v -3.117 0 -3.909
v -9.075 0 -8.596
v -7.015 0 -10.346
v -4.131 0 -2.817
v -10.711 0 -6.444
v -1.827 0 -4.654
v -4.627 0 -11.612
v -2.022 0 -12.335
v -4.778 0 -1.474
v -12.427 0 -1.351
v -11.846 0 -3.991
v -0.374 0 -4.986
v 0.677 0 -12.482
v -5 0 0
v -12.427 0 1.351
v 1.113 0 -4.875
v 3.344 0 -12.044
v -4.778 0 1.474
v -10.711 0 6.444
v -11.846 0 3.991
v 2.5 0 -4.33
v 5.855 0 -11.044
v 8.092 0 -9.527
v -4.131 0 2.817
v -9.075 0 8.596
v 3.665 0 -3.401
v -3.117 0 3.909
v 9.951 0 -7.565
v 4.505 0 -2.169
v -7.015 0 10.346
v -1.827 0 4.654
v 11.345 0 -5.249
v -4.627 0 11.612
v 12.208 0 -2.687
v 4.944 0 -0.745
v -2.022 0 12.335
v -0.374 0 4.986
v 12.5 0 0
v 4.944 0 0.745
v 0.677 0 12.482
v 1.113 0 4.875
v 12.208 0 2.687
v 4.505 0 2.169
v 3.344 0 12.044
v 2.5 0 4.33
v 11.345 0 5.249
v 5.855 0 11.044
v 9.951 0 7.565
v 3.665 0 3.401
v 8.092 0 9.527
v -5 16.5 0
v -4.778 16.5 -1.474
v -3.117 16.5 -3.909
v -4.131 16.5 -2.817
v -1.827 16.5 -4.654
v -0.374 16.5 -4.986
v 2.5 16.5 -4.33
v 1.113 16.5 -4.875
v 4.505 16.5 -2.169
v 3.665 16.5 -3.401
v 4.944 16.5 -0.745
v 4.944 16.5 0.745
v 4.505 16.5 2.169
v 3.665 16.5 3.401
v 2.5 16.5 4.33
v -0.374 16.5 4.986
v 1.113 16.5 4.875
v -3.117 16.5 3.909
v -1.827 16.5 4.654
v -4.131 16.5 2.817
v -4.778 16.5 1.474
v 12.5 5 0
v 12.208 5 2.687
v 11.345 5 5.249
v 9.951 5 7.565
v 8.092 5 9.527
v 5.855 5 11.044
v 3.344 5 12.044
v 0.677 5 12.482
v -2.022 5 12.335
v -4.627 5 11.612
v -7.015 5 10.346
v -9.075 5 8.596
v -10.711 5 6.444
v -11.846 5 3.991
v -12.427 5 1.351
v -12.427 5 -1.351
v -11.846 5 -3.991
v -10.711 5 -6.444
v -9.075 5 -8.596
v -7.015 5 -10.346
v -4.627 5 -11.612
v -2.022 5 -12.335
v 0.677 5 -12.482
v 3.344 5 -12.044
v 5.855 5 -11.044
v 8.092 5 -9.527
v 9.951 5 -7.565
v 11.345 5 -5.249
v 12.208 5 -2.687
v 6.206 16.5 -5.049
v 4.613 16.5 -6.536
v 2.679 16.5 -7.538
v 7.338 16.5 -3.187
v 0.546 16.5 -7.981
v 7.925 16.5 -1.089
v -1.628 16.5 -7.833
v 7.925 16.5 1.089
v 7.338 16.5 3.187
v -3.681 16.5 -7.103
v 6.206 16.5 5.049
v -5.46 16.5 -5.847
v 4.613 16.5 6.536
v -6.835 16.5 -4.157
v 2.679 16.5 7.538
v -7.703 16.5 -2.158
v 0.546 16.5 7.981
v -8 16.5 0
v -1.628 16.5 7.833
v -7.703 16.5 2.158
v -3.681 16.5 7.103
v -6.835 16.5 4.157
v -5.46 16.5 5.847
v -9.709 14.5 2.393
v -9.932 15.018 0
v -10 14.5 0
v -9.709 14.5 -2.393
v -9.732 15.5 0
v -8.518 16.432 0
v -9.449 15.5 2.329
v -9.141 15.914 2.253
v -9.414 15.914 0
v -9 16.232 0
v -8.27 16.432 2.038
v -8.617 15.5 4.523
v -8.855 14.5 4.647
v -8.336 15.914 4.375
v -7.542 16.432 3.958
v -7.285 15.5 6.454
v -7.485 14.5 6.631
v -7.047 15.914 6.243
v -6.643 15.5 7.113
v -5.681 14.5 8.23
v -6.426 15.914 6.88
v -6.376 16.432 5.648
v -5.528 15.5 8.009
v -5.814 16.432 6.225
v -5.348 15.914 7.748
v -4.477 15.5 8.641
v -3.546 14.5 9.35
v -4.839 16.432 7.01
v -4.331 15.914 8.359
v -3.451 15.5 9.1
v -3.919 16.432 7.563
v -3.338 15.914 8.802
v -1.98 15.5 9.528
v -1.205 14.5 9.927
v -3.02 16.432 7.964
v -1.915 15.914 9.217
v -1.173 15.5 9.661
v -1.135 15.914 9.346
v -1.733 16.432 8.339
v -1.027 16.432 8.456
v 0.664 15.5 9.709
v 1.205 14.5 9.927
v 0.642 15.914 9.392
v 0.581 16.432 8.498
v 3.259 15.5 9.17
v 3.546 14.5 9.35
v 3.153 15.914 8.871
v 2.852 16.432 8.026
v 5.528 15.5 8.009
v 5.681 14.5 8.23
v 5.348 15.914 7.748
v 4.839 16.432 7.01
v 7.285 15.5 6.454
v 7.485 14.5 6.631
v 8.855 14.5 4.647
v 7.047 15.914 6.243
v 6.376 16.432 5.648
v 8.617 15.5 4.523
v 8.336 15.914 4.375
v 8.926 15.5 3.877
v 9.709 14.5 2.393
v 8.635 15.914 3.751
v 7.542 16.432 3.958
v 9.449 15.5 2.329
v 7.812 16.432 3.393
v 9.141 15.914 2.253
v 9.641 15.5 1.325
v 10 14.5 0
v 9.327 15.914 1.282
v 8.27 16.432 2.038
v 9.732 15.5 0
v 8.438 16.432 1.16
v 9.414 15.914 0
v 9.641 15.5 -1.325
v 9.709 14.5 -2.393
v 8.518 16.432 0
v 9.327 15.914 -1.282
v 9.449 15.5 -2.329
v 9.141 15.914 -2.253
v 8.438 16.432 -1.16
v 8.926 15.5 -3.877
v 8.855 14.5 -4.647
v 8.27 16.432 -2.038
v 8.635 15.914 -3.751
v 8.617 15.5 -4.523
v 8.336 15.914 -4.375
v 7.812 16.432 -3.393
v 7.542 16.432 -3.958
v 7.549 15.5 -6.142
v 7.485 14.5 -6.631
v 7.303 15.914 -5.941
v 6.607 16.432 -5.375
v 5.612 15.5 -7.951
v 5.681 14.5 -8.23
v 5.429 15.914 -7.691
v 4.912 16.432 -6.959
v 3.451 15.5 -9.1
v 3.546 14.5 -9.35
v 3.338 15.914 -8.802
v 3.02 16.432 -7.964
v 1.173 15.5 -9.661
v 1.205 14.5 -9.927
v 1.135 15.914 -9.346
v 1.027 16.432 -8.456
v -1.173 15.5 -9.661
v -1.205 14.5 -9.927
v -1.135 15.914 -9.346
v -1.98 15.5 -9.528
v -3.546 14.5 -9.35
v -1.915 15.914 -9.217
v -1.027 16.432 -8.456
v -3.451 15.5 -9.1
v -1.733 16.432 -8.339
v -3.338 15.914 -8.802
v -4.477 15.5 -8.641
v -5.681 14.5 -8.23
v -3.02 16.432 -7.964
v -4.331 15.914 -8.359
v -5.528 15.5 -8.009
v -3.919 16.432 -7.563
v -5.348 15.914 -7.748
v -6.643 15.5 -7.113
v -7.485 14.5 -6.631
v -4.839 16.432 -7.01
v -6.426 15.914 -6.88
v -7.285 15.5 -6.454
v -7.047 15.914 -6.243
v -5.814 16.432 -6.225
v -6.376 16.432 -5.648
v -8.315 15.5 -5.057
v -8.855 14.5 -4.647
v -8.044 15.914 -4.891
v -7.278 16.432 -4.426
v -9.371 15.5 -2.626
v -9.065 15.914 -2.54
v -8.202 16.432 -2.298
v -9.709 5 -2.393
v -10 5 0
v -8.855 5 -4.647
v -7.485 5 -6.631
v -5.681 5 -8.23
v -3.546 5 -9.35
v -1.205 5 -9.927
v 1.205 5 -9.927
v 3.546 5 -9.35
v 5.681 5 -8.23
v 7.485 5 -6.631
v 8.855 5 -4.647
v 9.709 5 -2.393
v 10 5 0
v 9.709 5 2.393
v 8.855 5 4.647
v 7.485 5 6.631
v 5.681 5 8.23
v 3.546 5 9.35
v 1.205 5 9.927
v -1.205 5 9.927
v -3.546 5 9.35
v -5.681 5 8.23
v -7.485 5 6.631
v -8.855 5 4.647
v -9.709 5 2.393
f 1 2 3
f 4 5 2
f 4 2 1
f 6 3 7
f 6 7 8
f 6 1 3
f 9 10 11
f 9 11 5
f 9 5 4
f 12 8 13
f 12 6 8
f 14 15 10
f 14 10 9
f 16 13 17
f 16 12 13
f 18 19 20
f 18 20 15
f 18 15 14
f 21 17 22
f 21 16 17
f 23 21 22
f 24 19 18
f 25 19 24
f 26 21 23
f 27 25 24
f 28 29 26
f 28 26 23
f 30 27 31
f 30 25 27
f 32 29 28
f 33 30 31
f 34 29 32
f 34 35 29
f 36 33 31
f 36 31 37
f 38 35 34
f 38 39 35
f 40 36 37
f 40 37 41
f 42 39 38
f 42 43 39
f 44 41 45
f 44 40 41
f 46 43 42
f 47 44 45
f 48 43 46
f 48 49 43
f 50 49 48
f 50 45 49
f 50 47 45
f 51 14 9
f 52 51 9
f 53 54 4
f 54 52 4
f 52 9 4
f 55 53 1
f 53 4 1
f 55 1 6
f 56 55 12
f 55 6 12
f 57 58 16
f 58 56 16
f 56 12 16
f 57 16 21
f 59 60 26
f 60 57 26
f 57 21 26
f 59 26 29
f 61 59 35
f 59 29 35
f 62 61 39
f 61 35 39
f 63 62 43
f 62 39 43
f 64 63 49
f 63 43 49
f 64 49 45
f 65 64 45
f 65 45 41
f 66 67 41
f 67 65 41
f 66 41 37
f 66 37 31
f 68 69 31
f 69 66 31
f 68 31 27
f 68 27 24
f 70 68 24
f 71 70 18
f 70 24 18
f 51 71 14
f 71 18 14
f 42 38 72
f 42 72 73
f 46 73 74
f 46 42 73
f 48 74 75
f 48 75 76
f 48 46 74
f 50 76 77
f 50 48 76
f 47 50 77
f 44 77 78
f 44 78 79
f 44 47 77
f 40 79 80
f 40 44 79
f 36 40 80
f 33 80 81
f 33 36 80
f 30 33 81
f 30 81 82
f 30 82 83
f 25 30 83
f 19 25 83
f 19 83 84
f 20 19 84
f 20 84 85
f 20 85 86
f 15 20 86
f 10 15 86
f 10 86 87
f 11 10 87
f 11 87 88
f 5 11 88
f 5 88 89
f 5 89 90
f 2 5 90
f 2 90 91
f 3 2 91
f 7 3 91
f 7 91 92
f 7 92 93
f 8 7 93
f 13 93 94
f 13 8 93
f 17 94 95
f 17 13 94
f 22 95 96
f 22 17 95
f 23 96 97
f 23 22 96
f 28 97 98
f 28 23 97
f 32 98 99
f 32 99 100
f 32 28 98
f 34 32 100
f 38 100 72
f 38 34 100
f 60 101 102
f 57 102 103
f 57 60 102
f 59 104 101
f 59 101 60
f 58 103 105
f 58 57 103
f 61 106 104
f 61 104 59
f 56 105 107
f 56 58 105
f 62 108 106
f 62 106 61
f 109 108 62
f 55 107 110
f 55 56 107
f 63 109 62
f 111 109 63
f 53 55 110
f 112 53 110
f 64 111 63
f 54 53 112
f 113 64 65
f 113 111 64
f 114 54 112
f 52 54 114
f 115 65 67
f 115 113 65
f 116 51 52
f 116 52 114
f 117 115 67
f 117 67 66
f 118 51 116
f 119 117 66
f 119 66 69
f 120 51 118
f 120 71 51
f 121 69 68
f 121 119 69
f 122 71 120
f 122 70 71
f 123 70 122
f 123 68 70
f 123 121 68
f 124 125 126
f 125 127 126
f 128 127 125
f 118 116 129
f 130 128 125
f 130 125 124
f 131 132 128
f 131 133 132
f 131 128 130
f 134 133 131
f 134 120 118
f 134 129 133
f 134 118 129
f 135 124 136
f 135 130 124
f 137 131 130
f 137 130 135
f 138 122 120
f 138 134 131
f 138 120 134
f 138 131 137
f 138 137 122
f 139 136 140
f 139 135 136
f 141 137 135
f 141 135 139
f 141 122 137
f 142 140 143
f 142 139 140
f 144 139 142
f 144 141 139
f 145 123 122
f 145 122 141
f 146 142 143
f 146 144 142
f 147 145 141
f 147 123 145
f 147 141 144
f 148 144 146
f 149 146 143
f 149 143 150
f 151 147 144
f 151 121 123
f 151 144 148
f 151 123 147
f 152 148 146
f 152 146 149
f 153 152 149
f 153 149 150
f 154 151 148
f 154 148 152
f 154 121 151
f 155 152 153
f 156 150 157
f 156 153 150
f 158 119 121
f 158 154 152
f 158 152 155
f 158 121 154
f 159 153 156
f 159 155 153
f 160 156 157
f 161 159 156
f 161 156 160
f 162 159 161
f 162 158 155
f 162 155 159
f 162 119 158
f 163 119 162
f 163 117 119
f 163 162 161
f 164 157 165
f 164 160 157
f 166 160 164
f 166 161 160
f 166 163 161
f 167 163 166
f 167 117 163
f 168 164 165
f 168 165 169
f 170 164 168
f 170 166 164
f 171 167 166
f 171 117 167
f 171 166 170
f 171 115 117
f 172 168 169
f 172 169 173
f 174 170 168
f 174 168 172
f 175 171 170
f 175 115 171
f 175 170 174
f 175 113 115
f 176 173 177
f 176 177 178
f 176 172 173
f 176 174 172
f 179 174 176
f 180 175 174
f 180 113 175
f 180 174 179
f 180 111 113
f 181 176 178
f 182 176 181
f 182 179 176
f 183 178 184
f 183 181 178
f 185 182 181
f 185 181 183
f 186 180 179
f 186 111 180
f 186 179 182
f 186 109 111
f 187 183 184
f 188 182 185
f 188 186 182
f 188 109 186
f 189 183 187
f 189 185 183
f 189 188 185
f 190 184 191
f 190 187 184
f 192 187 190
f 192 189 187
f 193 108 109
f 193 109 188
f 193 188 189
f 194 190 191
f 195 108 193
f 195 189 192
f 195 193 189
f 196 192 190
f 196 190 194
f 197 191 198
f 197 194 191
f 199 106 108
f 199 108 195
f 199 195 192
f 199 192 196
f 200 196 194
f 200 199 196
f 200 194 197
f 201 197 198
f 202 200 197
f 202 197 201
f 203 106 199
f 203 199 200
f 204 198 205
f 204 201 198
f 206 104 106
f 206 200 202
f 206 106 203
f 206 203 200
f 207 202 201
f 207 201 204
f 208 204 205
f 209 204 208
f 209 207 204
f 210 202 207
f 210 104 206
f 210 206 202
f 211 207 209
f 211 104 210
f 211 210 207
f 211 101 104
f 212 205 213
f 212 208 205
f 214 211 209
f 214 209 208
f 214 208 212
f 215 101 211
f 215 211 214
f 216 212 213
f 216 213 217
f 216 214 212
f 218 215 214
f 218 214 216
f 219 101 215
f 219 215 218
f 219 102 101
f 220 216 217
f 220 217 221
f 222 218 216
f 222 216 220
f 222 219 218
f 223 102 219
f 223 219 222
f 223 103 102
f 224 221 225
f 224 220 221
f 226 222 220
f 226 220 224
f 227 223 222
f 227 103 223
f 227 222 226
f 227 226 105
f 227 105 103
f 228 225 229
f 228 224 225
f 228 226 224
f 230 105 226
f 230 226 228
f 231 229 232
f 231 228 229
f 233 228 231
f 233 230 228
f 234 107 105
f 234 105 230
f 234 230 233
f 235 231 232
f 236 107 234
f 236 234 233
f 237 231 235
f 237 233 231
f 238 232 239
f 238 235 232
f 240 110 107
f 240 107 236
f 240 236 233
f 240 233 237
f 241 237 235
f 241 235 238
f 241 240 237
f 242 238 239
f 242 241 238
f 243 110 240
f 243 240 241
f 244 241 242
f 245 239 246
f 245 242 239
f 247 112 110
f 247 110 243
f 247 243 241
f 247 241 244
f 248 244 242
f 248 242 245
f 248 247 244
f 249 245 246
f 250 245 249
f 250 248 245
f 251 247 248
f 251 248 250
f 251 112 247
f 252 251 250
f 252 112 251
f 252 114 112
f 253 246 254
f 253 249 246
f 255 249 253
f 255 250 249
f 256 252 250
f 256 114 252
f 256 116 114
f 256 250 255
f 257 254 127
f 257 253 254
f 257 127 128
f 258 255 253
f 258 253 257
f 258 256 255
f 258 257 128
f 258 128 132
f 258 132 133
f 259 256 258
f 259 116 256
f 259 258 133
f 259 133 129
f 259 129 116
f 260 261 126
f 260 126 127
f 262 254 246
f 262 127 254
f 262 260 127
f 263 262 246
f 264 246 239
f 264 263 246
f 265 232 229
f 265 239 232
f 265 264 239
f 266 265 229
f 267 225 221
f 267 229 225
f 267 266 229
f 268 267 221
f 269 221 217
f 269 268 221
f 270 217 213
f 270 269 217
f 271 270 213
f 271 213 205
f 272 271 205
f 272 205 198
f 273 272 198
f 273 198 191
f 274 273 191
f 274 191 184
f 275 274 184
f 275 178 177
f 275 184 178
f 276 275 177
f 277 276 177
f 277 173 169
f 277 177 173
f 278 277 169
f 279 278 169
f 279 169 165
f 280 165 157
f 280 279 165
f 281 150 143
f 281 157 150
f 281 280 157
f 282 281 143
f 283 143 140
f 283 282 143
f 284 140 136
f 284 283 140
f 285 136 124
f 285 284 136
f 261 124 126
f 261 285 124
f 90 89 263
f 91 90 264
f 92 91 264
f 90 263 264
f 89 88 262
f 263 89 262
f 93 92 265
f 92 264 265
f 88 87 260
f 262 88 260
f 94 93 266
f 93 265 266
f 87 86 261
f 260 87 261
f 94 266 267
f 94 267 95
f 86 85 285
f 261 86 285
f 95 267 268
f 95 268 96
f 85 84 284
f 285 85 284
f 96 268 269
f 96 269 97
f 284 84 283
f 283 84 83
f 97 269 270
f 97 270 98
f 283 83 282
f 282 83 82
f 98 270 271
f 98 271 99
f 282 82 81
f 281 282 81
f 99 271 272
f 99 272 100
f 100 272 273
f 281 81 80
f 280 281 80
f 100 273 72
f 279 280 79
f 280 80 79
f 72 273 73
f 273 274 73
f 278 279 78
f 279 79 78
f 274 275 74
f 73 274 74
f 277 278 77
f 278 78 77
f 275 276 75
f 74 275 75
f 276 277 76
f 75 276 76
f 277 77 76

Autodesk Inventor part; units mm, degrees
ref_plane "YZ Plane" through (0, 0, 0) normal (1, 0, 0) x (0, 1, 0)
ref_plane "XZ Plane" through (0, 0, 0) normal (0, 1, 0) x (-1, 0, 0)
ref_plane "XY Plane" through (0, 0, 0) normal (0, 0, 1) x (1, 0, 0)
sketch "Sketch1" plane through (0, 0, 0) normal (0, 1, 0) x (-1, 0, 0)
  circle A0 centre (0, 0) radius 5
  circle A1 centre (0, 0) radius 10
  dimension "d0" = 10
  dimension "d1" = 20
extrude "Extrusion1" add sketch "Sketch1" along normal blind 16.5
sketch "Sketch2" plane through (0, 0, 0) normal (0, -1, 0) x (1, 0, 0)
  circle A0 centre (0, 0) radius 12.5
  circle A1 centre (0, 0) radius 10 projected
  dimension "d4" = 25
extrude "Extrusion2" add sketch "Sketch2" against normal blind 5
fillet "Fillet1" radius 2 1 edges at (10, 16.5, 0)
properties part number "Bushing_beam" material "Brass, Soft Yellow"
